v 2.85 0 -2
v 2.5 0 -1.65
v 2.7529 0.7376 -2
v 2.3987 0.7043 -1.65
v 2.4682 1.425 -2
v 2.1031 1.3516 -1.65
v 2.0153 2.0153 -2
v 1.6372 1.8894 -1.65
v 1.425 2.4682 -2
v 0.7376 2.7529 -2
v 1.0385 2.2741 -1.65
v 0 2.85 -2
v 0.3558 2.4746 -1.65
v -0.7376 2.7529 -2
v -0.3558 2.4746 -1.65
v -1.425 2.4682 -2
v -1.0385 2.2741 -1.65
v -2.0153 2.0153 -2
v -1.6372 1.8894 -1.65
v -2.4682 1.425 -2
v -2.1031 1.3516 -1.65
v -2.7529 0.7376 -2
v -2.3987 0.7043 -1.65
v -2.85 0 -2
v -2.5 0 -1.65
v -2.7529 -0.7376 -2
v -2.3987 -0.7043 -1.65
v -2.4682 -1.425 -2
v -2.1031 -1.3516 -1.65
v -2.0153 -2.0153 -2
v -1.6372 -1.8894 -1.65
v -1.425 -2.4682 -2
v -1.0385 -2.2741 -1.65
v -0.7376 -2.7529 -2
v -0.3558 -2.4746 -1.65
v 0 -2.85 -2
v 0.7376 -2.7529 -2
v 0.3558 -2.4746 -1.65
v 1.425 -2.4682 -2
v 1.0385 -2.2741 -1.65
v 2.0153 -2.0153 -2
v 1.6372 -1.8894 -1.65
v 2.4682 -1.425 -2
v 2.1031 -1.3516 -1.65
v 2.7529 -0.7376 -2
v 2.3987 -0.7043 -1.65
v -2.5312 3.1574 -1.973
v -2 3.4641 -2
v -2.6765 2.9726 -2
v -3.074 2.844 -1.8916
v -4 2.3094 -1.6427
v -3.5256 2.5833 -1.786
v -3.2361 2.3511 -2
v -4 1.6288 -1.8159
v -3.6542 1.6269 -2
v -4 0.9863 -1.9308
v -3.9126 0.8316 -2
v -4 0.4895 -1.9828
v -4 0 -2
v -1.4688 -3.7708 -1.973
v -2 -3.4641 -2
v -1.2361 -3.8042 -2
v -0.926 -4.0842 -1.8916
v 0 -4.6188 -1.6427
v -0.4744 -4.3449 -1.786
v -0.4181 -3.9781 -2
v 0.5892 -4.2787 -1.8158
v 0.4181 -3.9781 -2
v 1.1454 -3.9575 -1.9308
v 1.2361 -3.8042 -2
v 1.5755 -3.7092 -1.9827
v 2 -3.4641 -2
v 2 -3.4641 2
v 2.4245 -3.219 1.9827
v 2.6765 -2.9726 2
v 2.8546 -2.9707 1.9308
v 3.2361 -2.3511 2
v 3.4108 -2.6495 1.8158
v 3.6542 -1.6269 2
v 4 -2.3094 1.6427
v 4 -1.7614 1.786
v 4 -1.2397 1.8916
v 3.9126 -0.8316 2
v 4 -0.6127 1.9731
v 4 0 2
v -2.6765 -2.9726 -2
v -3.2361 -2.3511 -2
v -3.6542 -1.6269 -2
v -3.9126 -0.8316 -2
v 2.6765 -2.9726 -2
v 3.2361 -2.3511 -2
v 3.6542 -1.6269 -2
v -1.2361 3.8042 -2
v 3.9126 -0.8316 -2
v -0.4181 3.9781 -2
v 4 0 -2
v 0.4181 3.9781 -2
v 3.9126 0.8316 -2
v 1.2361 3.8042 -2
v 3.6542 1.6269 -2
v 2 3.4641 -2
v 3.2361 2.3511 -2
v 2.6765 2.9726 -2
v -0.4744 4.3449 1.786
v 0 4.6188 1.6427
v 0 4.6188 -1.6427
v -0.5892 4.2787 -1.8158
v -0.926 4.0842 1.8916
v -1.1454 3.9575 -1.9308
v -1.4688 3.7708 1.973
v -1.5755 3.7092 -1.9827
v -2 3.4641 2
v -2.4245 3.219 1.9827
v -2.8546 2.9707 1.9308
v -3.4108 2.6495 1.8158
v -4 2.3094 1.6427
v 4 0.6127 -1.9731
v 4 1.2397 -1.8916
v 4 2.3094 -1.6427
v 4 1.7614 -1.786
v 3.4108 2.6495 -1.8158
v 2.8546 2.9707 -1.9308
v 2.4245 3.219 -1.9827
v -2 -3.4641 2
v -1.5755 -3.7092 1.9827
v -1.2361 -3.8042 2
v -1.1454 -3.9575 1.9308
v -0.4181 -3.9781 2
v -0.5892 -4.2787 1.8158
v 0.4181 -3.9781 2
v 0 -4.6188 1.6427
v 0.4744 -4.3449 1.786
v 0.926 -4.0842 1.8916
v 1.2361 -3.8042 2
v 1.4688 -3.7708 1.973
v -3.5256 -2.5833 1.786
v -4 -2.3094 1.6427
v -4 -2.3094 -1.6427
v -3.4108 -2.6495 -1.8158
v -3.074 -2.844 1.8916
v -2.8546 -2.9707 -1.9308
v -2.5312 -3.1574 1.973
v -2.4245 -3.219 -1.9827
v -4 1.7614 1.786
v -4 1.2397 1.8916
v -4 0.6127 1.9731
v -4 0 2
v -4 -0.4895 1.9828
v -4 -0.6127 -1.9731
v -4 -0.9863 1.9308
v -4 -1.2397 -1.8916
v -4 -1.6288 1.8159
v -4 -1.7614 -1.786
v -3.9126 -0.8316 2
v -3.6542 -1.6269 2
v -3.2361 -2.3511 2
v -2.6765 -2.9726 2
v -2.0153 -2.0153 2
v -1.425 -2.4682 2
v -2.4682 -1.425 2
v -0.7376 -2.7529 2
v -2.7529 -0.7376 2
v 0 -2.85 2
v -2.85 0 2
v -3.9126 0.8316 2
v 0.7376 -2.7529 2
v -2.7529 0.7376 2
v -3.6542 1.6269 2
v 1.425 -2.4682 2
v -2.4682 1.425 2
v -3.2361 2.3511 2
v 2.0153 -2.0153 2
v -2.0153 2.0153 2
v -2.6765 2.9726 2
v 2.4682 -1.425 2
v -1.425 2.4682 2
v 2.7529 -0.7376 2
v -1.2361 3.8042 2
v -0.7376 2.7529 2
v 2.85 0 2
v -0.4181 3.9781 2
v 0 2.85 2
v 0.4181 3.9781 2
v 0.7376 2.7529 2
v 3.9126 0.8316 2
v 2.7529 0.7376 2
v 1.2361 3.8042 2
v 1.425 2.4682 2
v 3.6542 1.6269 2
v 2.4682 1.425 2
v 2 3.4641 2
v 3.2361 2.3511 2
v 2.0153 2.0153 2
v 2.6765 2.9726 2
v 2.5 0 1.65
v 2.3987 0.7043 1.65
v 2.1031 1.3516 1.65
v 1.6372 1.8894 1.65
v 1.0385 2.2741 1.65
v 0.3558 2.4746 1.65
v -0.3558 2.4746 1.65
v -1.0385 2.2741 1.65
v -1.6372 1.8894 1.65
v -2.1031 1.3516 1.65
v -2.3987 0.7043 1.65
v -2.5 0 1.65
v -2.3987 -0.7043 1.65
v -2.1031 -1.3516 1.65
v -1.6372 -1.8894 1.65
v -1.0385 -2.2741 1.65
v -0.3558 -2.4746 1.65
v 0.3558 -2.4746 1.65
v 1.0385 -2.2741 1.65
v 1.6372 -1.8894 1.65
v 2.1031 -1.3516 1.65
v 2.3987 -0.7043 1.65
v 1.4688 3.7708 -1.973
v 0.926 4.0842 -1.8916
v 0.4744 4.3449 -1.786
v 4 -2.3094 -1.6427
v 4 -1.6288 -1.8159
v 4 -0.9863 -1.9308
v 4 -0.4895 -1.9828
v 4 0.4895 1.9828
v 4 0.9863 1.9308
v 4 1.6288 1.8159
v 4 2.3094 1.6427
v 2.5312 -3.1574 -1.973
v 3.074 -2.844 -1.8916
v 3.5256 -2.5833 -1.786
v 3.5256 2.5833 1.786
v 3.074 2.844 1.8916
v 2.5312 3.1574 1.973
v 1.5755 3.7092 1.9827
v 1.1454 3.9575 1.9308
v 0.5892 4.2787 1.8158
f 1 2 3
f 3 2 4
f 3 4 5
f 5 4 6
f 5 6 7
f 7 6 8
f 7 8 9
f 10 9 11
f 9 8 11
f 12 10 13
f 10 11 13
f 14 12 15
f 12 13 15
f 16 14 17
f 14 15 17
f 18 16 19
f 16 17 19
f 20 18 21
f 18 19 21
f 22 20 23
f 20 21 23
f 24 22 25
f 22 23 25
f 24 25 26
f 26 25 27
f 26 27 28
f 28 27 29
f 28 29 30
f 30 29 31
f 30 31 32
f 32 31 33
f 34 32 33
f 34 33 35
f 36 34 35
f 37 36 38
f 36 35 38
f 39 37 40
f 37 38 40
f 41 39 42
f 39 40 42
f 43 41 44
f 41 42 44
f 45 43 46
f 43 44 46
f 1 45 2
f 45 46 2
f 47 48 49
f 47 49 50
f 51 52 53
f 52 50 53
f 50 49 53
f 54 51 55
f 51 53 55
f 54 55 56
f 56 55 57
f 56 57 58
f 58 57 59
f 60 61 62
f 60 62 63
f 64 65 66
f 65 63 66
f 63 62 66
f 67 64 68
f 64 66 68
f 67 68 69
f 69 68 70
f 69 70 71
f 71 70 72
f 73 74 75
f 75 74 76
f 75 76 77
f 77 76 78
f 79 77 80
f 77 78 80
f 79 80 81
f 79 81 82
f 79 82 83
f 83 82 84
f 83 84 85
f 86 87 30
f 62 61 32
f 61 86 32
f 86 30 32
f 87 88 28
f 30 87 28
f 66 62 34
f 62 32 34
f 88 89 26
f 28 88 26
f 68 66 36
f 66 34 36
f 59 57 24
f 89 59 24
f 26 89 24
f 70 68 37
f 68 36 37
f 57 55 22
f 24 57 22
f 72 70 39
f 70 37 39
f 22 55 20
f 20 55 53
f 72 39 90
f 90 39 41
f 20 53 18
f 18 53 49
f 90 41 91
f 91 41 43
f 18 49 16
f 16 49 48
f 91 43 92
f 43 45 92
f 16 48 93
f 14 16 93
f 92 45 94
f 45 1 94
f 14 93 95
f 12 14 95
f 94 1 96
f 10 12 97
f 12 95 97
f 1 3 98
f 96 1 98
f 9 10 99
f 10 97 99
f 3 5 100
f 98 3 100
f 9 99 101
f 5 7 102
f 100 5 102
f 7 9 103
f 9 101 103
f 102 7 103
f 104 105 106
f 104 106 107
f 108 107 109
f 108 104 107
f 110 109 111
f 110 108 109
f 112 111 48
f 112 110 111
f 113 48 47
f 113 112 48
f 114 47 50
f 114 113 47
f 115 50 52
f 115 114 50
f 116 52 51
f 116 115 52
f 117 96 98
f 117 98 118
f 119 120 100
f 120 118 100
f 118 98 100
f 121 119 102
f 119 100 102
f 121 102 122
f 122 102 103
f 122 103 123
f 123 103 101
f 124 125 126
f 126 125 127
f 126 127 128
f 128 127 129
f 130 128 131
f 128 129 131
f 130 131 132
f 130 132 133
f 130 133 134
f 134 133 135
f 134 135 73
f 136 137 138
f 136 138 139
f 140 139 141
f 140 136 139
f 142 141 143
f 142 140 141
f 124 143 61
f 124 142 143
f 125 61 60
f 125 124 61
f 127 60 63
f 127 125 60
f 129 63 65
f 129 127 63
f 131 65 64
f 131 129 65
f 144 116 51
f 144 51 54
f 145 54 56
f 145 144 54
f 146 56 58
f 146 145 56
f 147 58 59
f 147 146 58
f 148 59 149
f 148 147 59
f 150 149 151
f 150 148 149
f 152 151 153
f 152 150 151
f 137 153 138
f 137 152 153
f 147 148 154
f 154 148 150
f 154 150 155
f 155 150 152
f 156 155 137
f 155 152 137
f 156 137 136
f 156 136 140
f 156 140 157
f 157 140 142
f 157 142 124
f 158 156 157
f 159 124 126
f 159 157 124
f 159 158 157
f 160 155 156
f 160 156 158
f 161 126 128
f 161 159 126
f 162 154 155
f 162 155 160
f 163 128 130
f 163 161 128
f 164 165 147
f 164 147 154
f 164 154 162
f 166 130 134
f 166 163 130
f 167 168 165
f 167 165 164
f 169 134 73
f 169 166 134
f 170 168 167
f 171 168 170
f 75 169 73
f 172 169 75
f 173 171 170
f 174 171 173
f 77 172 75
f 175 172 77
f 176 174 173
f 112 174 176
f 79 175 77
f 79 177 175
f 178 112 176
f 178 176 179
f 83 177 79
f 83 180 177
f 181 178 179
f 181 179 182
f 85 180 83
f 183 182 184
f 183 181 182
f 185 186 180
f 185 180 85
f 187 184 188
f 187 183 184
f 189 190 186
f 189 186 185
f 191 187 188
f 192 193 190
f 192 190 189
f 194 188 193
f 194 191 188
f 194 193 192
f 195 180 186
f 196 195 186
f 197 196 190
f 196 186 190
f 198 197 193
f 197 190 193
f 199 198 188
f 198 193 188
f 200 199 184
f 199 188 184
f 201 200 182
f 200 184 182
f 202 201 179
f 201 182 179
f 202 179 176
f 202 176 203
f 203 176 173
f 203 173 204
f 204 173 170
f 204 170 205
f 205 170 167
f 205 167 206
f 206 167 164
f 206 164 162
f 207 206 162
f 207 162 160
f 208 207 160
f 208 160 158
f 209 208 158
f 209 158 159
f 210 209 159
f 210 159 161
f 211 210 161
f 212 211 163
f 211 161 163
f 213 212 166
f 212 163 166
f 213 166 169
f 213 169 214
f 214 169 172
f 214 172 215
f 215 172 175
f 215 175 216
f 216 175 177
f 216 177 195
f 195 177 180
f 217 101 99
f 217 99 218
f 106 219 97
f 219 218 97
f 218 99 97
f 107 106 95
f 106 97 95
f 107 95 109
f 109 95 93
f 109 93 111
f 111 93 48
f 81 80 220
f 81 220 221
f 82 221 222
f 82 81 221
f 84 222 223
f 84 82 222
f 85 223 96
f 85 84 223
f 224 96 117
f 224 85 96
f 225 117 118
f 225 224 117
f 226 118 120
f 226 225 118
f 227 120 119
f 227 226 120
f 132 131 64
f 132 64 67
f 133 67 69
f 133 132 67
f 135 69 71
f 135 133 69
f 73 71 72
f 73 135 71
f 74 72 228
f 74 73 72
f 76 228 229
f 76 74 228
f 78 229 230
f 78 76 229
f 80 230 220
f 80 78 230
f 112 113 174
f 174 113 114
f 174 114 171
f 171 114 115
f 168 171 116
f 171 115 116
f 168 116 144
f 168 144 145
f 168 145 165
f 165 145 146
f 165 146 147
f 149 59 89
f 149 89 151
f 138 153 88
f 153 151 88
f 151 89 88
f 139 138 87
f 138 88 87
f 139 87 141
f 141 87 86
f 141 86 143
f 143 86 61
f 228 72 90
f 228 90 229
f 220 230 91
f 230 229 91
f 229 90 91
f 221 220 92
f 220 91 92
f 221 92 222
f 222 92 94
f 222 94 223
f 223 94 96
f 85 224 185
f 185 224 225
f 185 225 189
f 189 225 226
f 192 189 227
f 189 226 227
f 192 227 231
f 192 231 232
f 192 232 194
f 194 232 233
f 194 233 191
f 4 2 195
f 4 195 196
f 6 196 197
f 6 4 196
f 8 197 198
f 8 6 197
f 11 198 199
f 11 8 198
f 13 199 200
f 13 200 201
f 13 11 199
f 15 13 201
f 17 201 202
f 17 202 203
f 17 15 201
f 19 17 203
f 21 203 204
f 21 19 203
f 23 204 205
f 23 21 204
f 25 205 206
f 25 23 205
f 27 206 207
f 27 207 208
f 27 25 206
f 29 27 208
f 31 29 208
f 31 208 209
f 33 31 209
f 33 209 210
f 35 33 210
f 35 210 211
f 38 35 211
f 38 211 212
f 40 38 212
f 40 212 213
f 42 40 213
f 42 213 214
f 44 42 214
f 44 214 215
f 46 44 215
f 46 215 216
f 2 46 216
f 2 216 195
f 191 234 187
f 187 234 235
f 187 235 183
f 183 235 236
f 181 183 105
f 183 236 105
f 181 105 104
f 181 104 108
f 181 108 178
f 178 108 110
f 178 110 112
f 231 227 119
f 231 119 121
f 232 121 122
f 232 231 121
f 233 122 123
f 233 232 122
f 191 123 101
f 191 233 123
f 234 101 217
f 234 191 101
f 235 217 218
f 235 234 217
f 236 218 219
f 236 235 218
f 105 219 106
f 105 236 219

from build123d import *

# Parameters (mm, degrees)
SKETCH_R     = 2.5
PAD_DEPTH    = 2
CHAMFER_SIZE = 0.35


with BuildPart() as part:
    # Sketch → Pad (new body, symmetric)
    with BuildSketch(Plane.XY):
        Polygon((0, -4.618802), (4, -2.309401), (4, 2.309401), (0, 4.618802), (-4, 2.309401), (-4, -2.309401), align=None)
        Circle(SKETCH_R, mode=Mode.SUBTRACT)
    extrude(amount=PAD_DEPTH, both=True)

    # Sketch001 → Groove (revolve, cut)
    with BuildSketch(Plane.YZ):
        Polygon((-4, 2), (-4.618802, 1.642734), (-4.618802, 2), align=None)
        Polygon((-4, -2), (-4.618802, -2), (-4.618802, -1.642734), align=None)
    revolve(axis=Axis((0, 0, 0), (0, 0, 1)), mode=Mode.SUBTRACT)

    # Chamfer
    chamfer_edges = [part.edges().sort_by_distance(p)[0] for p in [
        (-2.5, 0, 2),
        (-2.5, 0, -2),
    ]]
    chamfer(chamfer_edges, length=CHAMFER_SIZE)


solid = part.part
